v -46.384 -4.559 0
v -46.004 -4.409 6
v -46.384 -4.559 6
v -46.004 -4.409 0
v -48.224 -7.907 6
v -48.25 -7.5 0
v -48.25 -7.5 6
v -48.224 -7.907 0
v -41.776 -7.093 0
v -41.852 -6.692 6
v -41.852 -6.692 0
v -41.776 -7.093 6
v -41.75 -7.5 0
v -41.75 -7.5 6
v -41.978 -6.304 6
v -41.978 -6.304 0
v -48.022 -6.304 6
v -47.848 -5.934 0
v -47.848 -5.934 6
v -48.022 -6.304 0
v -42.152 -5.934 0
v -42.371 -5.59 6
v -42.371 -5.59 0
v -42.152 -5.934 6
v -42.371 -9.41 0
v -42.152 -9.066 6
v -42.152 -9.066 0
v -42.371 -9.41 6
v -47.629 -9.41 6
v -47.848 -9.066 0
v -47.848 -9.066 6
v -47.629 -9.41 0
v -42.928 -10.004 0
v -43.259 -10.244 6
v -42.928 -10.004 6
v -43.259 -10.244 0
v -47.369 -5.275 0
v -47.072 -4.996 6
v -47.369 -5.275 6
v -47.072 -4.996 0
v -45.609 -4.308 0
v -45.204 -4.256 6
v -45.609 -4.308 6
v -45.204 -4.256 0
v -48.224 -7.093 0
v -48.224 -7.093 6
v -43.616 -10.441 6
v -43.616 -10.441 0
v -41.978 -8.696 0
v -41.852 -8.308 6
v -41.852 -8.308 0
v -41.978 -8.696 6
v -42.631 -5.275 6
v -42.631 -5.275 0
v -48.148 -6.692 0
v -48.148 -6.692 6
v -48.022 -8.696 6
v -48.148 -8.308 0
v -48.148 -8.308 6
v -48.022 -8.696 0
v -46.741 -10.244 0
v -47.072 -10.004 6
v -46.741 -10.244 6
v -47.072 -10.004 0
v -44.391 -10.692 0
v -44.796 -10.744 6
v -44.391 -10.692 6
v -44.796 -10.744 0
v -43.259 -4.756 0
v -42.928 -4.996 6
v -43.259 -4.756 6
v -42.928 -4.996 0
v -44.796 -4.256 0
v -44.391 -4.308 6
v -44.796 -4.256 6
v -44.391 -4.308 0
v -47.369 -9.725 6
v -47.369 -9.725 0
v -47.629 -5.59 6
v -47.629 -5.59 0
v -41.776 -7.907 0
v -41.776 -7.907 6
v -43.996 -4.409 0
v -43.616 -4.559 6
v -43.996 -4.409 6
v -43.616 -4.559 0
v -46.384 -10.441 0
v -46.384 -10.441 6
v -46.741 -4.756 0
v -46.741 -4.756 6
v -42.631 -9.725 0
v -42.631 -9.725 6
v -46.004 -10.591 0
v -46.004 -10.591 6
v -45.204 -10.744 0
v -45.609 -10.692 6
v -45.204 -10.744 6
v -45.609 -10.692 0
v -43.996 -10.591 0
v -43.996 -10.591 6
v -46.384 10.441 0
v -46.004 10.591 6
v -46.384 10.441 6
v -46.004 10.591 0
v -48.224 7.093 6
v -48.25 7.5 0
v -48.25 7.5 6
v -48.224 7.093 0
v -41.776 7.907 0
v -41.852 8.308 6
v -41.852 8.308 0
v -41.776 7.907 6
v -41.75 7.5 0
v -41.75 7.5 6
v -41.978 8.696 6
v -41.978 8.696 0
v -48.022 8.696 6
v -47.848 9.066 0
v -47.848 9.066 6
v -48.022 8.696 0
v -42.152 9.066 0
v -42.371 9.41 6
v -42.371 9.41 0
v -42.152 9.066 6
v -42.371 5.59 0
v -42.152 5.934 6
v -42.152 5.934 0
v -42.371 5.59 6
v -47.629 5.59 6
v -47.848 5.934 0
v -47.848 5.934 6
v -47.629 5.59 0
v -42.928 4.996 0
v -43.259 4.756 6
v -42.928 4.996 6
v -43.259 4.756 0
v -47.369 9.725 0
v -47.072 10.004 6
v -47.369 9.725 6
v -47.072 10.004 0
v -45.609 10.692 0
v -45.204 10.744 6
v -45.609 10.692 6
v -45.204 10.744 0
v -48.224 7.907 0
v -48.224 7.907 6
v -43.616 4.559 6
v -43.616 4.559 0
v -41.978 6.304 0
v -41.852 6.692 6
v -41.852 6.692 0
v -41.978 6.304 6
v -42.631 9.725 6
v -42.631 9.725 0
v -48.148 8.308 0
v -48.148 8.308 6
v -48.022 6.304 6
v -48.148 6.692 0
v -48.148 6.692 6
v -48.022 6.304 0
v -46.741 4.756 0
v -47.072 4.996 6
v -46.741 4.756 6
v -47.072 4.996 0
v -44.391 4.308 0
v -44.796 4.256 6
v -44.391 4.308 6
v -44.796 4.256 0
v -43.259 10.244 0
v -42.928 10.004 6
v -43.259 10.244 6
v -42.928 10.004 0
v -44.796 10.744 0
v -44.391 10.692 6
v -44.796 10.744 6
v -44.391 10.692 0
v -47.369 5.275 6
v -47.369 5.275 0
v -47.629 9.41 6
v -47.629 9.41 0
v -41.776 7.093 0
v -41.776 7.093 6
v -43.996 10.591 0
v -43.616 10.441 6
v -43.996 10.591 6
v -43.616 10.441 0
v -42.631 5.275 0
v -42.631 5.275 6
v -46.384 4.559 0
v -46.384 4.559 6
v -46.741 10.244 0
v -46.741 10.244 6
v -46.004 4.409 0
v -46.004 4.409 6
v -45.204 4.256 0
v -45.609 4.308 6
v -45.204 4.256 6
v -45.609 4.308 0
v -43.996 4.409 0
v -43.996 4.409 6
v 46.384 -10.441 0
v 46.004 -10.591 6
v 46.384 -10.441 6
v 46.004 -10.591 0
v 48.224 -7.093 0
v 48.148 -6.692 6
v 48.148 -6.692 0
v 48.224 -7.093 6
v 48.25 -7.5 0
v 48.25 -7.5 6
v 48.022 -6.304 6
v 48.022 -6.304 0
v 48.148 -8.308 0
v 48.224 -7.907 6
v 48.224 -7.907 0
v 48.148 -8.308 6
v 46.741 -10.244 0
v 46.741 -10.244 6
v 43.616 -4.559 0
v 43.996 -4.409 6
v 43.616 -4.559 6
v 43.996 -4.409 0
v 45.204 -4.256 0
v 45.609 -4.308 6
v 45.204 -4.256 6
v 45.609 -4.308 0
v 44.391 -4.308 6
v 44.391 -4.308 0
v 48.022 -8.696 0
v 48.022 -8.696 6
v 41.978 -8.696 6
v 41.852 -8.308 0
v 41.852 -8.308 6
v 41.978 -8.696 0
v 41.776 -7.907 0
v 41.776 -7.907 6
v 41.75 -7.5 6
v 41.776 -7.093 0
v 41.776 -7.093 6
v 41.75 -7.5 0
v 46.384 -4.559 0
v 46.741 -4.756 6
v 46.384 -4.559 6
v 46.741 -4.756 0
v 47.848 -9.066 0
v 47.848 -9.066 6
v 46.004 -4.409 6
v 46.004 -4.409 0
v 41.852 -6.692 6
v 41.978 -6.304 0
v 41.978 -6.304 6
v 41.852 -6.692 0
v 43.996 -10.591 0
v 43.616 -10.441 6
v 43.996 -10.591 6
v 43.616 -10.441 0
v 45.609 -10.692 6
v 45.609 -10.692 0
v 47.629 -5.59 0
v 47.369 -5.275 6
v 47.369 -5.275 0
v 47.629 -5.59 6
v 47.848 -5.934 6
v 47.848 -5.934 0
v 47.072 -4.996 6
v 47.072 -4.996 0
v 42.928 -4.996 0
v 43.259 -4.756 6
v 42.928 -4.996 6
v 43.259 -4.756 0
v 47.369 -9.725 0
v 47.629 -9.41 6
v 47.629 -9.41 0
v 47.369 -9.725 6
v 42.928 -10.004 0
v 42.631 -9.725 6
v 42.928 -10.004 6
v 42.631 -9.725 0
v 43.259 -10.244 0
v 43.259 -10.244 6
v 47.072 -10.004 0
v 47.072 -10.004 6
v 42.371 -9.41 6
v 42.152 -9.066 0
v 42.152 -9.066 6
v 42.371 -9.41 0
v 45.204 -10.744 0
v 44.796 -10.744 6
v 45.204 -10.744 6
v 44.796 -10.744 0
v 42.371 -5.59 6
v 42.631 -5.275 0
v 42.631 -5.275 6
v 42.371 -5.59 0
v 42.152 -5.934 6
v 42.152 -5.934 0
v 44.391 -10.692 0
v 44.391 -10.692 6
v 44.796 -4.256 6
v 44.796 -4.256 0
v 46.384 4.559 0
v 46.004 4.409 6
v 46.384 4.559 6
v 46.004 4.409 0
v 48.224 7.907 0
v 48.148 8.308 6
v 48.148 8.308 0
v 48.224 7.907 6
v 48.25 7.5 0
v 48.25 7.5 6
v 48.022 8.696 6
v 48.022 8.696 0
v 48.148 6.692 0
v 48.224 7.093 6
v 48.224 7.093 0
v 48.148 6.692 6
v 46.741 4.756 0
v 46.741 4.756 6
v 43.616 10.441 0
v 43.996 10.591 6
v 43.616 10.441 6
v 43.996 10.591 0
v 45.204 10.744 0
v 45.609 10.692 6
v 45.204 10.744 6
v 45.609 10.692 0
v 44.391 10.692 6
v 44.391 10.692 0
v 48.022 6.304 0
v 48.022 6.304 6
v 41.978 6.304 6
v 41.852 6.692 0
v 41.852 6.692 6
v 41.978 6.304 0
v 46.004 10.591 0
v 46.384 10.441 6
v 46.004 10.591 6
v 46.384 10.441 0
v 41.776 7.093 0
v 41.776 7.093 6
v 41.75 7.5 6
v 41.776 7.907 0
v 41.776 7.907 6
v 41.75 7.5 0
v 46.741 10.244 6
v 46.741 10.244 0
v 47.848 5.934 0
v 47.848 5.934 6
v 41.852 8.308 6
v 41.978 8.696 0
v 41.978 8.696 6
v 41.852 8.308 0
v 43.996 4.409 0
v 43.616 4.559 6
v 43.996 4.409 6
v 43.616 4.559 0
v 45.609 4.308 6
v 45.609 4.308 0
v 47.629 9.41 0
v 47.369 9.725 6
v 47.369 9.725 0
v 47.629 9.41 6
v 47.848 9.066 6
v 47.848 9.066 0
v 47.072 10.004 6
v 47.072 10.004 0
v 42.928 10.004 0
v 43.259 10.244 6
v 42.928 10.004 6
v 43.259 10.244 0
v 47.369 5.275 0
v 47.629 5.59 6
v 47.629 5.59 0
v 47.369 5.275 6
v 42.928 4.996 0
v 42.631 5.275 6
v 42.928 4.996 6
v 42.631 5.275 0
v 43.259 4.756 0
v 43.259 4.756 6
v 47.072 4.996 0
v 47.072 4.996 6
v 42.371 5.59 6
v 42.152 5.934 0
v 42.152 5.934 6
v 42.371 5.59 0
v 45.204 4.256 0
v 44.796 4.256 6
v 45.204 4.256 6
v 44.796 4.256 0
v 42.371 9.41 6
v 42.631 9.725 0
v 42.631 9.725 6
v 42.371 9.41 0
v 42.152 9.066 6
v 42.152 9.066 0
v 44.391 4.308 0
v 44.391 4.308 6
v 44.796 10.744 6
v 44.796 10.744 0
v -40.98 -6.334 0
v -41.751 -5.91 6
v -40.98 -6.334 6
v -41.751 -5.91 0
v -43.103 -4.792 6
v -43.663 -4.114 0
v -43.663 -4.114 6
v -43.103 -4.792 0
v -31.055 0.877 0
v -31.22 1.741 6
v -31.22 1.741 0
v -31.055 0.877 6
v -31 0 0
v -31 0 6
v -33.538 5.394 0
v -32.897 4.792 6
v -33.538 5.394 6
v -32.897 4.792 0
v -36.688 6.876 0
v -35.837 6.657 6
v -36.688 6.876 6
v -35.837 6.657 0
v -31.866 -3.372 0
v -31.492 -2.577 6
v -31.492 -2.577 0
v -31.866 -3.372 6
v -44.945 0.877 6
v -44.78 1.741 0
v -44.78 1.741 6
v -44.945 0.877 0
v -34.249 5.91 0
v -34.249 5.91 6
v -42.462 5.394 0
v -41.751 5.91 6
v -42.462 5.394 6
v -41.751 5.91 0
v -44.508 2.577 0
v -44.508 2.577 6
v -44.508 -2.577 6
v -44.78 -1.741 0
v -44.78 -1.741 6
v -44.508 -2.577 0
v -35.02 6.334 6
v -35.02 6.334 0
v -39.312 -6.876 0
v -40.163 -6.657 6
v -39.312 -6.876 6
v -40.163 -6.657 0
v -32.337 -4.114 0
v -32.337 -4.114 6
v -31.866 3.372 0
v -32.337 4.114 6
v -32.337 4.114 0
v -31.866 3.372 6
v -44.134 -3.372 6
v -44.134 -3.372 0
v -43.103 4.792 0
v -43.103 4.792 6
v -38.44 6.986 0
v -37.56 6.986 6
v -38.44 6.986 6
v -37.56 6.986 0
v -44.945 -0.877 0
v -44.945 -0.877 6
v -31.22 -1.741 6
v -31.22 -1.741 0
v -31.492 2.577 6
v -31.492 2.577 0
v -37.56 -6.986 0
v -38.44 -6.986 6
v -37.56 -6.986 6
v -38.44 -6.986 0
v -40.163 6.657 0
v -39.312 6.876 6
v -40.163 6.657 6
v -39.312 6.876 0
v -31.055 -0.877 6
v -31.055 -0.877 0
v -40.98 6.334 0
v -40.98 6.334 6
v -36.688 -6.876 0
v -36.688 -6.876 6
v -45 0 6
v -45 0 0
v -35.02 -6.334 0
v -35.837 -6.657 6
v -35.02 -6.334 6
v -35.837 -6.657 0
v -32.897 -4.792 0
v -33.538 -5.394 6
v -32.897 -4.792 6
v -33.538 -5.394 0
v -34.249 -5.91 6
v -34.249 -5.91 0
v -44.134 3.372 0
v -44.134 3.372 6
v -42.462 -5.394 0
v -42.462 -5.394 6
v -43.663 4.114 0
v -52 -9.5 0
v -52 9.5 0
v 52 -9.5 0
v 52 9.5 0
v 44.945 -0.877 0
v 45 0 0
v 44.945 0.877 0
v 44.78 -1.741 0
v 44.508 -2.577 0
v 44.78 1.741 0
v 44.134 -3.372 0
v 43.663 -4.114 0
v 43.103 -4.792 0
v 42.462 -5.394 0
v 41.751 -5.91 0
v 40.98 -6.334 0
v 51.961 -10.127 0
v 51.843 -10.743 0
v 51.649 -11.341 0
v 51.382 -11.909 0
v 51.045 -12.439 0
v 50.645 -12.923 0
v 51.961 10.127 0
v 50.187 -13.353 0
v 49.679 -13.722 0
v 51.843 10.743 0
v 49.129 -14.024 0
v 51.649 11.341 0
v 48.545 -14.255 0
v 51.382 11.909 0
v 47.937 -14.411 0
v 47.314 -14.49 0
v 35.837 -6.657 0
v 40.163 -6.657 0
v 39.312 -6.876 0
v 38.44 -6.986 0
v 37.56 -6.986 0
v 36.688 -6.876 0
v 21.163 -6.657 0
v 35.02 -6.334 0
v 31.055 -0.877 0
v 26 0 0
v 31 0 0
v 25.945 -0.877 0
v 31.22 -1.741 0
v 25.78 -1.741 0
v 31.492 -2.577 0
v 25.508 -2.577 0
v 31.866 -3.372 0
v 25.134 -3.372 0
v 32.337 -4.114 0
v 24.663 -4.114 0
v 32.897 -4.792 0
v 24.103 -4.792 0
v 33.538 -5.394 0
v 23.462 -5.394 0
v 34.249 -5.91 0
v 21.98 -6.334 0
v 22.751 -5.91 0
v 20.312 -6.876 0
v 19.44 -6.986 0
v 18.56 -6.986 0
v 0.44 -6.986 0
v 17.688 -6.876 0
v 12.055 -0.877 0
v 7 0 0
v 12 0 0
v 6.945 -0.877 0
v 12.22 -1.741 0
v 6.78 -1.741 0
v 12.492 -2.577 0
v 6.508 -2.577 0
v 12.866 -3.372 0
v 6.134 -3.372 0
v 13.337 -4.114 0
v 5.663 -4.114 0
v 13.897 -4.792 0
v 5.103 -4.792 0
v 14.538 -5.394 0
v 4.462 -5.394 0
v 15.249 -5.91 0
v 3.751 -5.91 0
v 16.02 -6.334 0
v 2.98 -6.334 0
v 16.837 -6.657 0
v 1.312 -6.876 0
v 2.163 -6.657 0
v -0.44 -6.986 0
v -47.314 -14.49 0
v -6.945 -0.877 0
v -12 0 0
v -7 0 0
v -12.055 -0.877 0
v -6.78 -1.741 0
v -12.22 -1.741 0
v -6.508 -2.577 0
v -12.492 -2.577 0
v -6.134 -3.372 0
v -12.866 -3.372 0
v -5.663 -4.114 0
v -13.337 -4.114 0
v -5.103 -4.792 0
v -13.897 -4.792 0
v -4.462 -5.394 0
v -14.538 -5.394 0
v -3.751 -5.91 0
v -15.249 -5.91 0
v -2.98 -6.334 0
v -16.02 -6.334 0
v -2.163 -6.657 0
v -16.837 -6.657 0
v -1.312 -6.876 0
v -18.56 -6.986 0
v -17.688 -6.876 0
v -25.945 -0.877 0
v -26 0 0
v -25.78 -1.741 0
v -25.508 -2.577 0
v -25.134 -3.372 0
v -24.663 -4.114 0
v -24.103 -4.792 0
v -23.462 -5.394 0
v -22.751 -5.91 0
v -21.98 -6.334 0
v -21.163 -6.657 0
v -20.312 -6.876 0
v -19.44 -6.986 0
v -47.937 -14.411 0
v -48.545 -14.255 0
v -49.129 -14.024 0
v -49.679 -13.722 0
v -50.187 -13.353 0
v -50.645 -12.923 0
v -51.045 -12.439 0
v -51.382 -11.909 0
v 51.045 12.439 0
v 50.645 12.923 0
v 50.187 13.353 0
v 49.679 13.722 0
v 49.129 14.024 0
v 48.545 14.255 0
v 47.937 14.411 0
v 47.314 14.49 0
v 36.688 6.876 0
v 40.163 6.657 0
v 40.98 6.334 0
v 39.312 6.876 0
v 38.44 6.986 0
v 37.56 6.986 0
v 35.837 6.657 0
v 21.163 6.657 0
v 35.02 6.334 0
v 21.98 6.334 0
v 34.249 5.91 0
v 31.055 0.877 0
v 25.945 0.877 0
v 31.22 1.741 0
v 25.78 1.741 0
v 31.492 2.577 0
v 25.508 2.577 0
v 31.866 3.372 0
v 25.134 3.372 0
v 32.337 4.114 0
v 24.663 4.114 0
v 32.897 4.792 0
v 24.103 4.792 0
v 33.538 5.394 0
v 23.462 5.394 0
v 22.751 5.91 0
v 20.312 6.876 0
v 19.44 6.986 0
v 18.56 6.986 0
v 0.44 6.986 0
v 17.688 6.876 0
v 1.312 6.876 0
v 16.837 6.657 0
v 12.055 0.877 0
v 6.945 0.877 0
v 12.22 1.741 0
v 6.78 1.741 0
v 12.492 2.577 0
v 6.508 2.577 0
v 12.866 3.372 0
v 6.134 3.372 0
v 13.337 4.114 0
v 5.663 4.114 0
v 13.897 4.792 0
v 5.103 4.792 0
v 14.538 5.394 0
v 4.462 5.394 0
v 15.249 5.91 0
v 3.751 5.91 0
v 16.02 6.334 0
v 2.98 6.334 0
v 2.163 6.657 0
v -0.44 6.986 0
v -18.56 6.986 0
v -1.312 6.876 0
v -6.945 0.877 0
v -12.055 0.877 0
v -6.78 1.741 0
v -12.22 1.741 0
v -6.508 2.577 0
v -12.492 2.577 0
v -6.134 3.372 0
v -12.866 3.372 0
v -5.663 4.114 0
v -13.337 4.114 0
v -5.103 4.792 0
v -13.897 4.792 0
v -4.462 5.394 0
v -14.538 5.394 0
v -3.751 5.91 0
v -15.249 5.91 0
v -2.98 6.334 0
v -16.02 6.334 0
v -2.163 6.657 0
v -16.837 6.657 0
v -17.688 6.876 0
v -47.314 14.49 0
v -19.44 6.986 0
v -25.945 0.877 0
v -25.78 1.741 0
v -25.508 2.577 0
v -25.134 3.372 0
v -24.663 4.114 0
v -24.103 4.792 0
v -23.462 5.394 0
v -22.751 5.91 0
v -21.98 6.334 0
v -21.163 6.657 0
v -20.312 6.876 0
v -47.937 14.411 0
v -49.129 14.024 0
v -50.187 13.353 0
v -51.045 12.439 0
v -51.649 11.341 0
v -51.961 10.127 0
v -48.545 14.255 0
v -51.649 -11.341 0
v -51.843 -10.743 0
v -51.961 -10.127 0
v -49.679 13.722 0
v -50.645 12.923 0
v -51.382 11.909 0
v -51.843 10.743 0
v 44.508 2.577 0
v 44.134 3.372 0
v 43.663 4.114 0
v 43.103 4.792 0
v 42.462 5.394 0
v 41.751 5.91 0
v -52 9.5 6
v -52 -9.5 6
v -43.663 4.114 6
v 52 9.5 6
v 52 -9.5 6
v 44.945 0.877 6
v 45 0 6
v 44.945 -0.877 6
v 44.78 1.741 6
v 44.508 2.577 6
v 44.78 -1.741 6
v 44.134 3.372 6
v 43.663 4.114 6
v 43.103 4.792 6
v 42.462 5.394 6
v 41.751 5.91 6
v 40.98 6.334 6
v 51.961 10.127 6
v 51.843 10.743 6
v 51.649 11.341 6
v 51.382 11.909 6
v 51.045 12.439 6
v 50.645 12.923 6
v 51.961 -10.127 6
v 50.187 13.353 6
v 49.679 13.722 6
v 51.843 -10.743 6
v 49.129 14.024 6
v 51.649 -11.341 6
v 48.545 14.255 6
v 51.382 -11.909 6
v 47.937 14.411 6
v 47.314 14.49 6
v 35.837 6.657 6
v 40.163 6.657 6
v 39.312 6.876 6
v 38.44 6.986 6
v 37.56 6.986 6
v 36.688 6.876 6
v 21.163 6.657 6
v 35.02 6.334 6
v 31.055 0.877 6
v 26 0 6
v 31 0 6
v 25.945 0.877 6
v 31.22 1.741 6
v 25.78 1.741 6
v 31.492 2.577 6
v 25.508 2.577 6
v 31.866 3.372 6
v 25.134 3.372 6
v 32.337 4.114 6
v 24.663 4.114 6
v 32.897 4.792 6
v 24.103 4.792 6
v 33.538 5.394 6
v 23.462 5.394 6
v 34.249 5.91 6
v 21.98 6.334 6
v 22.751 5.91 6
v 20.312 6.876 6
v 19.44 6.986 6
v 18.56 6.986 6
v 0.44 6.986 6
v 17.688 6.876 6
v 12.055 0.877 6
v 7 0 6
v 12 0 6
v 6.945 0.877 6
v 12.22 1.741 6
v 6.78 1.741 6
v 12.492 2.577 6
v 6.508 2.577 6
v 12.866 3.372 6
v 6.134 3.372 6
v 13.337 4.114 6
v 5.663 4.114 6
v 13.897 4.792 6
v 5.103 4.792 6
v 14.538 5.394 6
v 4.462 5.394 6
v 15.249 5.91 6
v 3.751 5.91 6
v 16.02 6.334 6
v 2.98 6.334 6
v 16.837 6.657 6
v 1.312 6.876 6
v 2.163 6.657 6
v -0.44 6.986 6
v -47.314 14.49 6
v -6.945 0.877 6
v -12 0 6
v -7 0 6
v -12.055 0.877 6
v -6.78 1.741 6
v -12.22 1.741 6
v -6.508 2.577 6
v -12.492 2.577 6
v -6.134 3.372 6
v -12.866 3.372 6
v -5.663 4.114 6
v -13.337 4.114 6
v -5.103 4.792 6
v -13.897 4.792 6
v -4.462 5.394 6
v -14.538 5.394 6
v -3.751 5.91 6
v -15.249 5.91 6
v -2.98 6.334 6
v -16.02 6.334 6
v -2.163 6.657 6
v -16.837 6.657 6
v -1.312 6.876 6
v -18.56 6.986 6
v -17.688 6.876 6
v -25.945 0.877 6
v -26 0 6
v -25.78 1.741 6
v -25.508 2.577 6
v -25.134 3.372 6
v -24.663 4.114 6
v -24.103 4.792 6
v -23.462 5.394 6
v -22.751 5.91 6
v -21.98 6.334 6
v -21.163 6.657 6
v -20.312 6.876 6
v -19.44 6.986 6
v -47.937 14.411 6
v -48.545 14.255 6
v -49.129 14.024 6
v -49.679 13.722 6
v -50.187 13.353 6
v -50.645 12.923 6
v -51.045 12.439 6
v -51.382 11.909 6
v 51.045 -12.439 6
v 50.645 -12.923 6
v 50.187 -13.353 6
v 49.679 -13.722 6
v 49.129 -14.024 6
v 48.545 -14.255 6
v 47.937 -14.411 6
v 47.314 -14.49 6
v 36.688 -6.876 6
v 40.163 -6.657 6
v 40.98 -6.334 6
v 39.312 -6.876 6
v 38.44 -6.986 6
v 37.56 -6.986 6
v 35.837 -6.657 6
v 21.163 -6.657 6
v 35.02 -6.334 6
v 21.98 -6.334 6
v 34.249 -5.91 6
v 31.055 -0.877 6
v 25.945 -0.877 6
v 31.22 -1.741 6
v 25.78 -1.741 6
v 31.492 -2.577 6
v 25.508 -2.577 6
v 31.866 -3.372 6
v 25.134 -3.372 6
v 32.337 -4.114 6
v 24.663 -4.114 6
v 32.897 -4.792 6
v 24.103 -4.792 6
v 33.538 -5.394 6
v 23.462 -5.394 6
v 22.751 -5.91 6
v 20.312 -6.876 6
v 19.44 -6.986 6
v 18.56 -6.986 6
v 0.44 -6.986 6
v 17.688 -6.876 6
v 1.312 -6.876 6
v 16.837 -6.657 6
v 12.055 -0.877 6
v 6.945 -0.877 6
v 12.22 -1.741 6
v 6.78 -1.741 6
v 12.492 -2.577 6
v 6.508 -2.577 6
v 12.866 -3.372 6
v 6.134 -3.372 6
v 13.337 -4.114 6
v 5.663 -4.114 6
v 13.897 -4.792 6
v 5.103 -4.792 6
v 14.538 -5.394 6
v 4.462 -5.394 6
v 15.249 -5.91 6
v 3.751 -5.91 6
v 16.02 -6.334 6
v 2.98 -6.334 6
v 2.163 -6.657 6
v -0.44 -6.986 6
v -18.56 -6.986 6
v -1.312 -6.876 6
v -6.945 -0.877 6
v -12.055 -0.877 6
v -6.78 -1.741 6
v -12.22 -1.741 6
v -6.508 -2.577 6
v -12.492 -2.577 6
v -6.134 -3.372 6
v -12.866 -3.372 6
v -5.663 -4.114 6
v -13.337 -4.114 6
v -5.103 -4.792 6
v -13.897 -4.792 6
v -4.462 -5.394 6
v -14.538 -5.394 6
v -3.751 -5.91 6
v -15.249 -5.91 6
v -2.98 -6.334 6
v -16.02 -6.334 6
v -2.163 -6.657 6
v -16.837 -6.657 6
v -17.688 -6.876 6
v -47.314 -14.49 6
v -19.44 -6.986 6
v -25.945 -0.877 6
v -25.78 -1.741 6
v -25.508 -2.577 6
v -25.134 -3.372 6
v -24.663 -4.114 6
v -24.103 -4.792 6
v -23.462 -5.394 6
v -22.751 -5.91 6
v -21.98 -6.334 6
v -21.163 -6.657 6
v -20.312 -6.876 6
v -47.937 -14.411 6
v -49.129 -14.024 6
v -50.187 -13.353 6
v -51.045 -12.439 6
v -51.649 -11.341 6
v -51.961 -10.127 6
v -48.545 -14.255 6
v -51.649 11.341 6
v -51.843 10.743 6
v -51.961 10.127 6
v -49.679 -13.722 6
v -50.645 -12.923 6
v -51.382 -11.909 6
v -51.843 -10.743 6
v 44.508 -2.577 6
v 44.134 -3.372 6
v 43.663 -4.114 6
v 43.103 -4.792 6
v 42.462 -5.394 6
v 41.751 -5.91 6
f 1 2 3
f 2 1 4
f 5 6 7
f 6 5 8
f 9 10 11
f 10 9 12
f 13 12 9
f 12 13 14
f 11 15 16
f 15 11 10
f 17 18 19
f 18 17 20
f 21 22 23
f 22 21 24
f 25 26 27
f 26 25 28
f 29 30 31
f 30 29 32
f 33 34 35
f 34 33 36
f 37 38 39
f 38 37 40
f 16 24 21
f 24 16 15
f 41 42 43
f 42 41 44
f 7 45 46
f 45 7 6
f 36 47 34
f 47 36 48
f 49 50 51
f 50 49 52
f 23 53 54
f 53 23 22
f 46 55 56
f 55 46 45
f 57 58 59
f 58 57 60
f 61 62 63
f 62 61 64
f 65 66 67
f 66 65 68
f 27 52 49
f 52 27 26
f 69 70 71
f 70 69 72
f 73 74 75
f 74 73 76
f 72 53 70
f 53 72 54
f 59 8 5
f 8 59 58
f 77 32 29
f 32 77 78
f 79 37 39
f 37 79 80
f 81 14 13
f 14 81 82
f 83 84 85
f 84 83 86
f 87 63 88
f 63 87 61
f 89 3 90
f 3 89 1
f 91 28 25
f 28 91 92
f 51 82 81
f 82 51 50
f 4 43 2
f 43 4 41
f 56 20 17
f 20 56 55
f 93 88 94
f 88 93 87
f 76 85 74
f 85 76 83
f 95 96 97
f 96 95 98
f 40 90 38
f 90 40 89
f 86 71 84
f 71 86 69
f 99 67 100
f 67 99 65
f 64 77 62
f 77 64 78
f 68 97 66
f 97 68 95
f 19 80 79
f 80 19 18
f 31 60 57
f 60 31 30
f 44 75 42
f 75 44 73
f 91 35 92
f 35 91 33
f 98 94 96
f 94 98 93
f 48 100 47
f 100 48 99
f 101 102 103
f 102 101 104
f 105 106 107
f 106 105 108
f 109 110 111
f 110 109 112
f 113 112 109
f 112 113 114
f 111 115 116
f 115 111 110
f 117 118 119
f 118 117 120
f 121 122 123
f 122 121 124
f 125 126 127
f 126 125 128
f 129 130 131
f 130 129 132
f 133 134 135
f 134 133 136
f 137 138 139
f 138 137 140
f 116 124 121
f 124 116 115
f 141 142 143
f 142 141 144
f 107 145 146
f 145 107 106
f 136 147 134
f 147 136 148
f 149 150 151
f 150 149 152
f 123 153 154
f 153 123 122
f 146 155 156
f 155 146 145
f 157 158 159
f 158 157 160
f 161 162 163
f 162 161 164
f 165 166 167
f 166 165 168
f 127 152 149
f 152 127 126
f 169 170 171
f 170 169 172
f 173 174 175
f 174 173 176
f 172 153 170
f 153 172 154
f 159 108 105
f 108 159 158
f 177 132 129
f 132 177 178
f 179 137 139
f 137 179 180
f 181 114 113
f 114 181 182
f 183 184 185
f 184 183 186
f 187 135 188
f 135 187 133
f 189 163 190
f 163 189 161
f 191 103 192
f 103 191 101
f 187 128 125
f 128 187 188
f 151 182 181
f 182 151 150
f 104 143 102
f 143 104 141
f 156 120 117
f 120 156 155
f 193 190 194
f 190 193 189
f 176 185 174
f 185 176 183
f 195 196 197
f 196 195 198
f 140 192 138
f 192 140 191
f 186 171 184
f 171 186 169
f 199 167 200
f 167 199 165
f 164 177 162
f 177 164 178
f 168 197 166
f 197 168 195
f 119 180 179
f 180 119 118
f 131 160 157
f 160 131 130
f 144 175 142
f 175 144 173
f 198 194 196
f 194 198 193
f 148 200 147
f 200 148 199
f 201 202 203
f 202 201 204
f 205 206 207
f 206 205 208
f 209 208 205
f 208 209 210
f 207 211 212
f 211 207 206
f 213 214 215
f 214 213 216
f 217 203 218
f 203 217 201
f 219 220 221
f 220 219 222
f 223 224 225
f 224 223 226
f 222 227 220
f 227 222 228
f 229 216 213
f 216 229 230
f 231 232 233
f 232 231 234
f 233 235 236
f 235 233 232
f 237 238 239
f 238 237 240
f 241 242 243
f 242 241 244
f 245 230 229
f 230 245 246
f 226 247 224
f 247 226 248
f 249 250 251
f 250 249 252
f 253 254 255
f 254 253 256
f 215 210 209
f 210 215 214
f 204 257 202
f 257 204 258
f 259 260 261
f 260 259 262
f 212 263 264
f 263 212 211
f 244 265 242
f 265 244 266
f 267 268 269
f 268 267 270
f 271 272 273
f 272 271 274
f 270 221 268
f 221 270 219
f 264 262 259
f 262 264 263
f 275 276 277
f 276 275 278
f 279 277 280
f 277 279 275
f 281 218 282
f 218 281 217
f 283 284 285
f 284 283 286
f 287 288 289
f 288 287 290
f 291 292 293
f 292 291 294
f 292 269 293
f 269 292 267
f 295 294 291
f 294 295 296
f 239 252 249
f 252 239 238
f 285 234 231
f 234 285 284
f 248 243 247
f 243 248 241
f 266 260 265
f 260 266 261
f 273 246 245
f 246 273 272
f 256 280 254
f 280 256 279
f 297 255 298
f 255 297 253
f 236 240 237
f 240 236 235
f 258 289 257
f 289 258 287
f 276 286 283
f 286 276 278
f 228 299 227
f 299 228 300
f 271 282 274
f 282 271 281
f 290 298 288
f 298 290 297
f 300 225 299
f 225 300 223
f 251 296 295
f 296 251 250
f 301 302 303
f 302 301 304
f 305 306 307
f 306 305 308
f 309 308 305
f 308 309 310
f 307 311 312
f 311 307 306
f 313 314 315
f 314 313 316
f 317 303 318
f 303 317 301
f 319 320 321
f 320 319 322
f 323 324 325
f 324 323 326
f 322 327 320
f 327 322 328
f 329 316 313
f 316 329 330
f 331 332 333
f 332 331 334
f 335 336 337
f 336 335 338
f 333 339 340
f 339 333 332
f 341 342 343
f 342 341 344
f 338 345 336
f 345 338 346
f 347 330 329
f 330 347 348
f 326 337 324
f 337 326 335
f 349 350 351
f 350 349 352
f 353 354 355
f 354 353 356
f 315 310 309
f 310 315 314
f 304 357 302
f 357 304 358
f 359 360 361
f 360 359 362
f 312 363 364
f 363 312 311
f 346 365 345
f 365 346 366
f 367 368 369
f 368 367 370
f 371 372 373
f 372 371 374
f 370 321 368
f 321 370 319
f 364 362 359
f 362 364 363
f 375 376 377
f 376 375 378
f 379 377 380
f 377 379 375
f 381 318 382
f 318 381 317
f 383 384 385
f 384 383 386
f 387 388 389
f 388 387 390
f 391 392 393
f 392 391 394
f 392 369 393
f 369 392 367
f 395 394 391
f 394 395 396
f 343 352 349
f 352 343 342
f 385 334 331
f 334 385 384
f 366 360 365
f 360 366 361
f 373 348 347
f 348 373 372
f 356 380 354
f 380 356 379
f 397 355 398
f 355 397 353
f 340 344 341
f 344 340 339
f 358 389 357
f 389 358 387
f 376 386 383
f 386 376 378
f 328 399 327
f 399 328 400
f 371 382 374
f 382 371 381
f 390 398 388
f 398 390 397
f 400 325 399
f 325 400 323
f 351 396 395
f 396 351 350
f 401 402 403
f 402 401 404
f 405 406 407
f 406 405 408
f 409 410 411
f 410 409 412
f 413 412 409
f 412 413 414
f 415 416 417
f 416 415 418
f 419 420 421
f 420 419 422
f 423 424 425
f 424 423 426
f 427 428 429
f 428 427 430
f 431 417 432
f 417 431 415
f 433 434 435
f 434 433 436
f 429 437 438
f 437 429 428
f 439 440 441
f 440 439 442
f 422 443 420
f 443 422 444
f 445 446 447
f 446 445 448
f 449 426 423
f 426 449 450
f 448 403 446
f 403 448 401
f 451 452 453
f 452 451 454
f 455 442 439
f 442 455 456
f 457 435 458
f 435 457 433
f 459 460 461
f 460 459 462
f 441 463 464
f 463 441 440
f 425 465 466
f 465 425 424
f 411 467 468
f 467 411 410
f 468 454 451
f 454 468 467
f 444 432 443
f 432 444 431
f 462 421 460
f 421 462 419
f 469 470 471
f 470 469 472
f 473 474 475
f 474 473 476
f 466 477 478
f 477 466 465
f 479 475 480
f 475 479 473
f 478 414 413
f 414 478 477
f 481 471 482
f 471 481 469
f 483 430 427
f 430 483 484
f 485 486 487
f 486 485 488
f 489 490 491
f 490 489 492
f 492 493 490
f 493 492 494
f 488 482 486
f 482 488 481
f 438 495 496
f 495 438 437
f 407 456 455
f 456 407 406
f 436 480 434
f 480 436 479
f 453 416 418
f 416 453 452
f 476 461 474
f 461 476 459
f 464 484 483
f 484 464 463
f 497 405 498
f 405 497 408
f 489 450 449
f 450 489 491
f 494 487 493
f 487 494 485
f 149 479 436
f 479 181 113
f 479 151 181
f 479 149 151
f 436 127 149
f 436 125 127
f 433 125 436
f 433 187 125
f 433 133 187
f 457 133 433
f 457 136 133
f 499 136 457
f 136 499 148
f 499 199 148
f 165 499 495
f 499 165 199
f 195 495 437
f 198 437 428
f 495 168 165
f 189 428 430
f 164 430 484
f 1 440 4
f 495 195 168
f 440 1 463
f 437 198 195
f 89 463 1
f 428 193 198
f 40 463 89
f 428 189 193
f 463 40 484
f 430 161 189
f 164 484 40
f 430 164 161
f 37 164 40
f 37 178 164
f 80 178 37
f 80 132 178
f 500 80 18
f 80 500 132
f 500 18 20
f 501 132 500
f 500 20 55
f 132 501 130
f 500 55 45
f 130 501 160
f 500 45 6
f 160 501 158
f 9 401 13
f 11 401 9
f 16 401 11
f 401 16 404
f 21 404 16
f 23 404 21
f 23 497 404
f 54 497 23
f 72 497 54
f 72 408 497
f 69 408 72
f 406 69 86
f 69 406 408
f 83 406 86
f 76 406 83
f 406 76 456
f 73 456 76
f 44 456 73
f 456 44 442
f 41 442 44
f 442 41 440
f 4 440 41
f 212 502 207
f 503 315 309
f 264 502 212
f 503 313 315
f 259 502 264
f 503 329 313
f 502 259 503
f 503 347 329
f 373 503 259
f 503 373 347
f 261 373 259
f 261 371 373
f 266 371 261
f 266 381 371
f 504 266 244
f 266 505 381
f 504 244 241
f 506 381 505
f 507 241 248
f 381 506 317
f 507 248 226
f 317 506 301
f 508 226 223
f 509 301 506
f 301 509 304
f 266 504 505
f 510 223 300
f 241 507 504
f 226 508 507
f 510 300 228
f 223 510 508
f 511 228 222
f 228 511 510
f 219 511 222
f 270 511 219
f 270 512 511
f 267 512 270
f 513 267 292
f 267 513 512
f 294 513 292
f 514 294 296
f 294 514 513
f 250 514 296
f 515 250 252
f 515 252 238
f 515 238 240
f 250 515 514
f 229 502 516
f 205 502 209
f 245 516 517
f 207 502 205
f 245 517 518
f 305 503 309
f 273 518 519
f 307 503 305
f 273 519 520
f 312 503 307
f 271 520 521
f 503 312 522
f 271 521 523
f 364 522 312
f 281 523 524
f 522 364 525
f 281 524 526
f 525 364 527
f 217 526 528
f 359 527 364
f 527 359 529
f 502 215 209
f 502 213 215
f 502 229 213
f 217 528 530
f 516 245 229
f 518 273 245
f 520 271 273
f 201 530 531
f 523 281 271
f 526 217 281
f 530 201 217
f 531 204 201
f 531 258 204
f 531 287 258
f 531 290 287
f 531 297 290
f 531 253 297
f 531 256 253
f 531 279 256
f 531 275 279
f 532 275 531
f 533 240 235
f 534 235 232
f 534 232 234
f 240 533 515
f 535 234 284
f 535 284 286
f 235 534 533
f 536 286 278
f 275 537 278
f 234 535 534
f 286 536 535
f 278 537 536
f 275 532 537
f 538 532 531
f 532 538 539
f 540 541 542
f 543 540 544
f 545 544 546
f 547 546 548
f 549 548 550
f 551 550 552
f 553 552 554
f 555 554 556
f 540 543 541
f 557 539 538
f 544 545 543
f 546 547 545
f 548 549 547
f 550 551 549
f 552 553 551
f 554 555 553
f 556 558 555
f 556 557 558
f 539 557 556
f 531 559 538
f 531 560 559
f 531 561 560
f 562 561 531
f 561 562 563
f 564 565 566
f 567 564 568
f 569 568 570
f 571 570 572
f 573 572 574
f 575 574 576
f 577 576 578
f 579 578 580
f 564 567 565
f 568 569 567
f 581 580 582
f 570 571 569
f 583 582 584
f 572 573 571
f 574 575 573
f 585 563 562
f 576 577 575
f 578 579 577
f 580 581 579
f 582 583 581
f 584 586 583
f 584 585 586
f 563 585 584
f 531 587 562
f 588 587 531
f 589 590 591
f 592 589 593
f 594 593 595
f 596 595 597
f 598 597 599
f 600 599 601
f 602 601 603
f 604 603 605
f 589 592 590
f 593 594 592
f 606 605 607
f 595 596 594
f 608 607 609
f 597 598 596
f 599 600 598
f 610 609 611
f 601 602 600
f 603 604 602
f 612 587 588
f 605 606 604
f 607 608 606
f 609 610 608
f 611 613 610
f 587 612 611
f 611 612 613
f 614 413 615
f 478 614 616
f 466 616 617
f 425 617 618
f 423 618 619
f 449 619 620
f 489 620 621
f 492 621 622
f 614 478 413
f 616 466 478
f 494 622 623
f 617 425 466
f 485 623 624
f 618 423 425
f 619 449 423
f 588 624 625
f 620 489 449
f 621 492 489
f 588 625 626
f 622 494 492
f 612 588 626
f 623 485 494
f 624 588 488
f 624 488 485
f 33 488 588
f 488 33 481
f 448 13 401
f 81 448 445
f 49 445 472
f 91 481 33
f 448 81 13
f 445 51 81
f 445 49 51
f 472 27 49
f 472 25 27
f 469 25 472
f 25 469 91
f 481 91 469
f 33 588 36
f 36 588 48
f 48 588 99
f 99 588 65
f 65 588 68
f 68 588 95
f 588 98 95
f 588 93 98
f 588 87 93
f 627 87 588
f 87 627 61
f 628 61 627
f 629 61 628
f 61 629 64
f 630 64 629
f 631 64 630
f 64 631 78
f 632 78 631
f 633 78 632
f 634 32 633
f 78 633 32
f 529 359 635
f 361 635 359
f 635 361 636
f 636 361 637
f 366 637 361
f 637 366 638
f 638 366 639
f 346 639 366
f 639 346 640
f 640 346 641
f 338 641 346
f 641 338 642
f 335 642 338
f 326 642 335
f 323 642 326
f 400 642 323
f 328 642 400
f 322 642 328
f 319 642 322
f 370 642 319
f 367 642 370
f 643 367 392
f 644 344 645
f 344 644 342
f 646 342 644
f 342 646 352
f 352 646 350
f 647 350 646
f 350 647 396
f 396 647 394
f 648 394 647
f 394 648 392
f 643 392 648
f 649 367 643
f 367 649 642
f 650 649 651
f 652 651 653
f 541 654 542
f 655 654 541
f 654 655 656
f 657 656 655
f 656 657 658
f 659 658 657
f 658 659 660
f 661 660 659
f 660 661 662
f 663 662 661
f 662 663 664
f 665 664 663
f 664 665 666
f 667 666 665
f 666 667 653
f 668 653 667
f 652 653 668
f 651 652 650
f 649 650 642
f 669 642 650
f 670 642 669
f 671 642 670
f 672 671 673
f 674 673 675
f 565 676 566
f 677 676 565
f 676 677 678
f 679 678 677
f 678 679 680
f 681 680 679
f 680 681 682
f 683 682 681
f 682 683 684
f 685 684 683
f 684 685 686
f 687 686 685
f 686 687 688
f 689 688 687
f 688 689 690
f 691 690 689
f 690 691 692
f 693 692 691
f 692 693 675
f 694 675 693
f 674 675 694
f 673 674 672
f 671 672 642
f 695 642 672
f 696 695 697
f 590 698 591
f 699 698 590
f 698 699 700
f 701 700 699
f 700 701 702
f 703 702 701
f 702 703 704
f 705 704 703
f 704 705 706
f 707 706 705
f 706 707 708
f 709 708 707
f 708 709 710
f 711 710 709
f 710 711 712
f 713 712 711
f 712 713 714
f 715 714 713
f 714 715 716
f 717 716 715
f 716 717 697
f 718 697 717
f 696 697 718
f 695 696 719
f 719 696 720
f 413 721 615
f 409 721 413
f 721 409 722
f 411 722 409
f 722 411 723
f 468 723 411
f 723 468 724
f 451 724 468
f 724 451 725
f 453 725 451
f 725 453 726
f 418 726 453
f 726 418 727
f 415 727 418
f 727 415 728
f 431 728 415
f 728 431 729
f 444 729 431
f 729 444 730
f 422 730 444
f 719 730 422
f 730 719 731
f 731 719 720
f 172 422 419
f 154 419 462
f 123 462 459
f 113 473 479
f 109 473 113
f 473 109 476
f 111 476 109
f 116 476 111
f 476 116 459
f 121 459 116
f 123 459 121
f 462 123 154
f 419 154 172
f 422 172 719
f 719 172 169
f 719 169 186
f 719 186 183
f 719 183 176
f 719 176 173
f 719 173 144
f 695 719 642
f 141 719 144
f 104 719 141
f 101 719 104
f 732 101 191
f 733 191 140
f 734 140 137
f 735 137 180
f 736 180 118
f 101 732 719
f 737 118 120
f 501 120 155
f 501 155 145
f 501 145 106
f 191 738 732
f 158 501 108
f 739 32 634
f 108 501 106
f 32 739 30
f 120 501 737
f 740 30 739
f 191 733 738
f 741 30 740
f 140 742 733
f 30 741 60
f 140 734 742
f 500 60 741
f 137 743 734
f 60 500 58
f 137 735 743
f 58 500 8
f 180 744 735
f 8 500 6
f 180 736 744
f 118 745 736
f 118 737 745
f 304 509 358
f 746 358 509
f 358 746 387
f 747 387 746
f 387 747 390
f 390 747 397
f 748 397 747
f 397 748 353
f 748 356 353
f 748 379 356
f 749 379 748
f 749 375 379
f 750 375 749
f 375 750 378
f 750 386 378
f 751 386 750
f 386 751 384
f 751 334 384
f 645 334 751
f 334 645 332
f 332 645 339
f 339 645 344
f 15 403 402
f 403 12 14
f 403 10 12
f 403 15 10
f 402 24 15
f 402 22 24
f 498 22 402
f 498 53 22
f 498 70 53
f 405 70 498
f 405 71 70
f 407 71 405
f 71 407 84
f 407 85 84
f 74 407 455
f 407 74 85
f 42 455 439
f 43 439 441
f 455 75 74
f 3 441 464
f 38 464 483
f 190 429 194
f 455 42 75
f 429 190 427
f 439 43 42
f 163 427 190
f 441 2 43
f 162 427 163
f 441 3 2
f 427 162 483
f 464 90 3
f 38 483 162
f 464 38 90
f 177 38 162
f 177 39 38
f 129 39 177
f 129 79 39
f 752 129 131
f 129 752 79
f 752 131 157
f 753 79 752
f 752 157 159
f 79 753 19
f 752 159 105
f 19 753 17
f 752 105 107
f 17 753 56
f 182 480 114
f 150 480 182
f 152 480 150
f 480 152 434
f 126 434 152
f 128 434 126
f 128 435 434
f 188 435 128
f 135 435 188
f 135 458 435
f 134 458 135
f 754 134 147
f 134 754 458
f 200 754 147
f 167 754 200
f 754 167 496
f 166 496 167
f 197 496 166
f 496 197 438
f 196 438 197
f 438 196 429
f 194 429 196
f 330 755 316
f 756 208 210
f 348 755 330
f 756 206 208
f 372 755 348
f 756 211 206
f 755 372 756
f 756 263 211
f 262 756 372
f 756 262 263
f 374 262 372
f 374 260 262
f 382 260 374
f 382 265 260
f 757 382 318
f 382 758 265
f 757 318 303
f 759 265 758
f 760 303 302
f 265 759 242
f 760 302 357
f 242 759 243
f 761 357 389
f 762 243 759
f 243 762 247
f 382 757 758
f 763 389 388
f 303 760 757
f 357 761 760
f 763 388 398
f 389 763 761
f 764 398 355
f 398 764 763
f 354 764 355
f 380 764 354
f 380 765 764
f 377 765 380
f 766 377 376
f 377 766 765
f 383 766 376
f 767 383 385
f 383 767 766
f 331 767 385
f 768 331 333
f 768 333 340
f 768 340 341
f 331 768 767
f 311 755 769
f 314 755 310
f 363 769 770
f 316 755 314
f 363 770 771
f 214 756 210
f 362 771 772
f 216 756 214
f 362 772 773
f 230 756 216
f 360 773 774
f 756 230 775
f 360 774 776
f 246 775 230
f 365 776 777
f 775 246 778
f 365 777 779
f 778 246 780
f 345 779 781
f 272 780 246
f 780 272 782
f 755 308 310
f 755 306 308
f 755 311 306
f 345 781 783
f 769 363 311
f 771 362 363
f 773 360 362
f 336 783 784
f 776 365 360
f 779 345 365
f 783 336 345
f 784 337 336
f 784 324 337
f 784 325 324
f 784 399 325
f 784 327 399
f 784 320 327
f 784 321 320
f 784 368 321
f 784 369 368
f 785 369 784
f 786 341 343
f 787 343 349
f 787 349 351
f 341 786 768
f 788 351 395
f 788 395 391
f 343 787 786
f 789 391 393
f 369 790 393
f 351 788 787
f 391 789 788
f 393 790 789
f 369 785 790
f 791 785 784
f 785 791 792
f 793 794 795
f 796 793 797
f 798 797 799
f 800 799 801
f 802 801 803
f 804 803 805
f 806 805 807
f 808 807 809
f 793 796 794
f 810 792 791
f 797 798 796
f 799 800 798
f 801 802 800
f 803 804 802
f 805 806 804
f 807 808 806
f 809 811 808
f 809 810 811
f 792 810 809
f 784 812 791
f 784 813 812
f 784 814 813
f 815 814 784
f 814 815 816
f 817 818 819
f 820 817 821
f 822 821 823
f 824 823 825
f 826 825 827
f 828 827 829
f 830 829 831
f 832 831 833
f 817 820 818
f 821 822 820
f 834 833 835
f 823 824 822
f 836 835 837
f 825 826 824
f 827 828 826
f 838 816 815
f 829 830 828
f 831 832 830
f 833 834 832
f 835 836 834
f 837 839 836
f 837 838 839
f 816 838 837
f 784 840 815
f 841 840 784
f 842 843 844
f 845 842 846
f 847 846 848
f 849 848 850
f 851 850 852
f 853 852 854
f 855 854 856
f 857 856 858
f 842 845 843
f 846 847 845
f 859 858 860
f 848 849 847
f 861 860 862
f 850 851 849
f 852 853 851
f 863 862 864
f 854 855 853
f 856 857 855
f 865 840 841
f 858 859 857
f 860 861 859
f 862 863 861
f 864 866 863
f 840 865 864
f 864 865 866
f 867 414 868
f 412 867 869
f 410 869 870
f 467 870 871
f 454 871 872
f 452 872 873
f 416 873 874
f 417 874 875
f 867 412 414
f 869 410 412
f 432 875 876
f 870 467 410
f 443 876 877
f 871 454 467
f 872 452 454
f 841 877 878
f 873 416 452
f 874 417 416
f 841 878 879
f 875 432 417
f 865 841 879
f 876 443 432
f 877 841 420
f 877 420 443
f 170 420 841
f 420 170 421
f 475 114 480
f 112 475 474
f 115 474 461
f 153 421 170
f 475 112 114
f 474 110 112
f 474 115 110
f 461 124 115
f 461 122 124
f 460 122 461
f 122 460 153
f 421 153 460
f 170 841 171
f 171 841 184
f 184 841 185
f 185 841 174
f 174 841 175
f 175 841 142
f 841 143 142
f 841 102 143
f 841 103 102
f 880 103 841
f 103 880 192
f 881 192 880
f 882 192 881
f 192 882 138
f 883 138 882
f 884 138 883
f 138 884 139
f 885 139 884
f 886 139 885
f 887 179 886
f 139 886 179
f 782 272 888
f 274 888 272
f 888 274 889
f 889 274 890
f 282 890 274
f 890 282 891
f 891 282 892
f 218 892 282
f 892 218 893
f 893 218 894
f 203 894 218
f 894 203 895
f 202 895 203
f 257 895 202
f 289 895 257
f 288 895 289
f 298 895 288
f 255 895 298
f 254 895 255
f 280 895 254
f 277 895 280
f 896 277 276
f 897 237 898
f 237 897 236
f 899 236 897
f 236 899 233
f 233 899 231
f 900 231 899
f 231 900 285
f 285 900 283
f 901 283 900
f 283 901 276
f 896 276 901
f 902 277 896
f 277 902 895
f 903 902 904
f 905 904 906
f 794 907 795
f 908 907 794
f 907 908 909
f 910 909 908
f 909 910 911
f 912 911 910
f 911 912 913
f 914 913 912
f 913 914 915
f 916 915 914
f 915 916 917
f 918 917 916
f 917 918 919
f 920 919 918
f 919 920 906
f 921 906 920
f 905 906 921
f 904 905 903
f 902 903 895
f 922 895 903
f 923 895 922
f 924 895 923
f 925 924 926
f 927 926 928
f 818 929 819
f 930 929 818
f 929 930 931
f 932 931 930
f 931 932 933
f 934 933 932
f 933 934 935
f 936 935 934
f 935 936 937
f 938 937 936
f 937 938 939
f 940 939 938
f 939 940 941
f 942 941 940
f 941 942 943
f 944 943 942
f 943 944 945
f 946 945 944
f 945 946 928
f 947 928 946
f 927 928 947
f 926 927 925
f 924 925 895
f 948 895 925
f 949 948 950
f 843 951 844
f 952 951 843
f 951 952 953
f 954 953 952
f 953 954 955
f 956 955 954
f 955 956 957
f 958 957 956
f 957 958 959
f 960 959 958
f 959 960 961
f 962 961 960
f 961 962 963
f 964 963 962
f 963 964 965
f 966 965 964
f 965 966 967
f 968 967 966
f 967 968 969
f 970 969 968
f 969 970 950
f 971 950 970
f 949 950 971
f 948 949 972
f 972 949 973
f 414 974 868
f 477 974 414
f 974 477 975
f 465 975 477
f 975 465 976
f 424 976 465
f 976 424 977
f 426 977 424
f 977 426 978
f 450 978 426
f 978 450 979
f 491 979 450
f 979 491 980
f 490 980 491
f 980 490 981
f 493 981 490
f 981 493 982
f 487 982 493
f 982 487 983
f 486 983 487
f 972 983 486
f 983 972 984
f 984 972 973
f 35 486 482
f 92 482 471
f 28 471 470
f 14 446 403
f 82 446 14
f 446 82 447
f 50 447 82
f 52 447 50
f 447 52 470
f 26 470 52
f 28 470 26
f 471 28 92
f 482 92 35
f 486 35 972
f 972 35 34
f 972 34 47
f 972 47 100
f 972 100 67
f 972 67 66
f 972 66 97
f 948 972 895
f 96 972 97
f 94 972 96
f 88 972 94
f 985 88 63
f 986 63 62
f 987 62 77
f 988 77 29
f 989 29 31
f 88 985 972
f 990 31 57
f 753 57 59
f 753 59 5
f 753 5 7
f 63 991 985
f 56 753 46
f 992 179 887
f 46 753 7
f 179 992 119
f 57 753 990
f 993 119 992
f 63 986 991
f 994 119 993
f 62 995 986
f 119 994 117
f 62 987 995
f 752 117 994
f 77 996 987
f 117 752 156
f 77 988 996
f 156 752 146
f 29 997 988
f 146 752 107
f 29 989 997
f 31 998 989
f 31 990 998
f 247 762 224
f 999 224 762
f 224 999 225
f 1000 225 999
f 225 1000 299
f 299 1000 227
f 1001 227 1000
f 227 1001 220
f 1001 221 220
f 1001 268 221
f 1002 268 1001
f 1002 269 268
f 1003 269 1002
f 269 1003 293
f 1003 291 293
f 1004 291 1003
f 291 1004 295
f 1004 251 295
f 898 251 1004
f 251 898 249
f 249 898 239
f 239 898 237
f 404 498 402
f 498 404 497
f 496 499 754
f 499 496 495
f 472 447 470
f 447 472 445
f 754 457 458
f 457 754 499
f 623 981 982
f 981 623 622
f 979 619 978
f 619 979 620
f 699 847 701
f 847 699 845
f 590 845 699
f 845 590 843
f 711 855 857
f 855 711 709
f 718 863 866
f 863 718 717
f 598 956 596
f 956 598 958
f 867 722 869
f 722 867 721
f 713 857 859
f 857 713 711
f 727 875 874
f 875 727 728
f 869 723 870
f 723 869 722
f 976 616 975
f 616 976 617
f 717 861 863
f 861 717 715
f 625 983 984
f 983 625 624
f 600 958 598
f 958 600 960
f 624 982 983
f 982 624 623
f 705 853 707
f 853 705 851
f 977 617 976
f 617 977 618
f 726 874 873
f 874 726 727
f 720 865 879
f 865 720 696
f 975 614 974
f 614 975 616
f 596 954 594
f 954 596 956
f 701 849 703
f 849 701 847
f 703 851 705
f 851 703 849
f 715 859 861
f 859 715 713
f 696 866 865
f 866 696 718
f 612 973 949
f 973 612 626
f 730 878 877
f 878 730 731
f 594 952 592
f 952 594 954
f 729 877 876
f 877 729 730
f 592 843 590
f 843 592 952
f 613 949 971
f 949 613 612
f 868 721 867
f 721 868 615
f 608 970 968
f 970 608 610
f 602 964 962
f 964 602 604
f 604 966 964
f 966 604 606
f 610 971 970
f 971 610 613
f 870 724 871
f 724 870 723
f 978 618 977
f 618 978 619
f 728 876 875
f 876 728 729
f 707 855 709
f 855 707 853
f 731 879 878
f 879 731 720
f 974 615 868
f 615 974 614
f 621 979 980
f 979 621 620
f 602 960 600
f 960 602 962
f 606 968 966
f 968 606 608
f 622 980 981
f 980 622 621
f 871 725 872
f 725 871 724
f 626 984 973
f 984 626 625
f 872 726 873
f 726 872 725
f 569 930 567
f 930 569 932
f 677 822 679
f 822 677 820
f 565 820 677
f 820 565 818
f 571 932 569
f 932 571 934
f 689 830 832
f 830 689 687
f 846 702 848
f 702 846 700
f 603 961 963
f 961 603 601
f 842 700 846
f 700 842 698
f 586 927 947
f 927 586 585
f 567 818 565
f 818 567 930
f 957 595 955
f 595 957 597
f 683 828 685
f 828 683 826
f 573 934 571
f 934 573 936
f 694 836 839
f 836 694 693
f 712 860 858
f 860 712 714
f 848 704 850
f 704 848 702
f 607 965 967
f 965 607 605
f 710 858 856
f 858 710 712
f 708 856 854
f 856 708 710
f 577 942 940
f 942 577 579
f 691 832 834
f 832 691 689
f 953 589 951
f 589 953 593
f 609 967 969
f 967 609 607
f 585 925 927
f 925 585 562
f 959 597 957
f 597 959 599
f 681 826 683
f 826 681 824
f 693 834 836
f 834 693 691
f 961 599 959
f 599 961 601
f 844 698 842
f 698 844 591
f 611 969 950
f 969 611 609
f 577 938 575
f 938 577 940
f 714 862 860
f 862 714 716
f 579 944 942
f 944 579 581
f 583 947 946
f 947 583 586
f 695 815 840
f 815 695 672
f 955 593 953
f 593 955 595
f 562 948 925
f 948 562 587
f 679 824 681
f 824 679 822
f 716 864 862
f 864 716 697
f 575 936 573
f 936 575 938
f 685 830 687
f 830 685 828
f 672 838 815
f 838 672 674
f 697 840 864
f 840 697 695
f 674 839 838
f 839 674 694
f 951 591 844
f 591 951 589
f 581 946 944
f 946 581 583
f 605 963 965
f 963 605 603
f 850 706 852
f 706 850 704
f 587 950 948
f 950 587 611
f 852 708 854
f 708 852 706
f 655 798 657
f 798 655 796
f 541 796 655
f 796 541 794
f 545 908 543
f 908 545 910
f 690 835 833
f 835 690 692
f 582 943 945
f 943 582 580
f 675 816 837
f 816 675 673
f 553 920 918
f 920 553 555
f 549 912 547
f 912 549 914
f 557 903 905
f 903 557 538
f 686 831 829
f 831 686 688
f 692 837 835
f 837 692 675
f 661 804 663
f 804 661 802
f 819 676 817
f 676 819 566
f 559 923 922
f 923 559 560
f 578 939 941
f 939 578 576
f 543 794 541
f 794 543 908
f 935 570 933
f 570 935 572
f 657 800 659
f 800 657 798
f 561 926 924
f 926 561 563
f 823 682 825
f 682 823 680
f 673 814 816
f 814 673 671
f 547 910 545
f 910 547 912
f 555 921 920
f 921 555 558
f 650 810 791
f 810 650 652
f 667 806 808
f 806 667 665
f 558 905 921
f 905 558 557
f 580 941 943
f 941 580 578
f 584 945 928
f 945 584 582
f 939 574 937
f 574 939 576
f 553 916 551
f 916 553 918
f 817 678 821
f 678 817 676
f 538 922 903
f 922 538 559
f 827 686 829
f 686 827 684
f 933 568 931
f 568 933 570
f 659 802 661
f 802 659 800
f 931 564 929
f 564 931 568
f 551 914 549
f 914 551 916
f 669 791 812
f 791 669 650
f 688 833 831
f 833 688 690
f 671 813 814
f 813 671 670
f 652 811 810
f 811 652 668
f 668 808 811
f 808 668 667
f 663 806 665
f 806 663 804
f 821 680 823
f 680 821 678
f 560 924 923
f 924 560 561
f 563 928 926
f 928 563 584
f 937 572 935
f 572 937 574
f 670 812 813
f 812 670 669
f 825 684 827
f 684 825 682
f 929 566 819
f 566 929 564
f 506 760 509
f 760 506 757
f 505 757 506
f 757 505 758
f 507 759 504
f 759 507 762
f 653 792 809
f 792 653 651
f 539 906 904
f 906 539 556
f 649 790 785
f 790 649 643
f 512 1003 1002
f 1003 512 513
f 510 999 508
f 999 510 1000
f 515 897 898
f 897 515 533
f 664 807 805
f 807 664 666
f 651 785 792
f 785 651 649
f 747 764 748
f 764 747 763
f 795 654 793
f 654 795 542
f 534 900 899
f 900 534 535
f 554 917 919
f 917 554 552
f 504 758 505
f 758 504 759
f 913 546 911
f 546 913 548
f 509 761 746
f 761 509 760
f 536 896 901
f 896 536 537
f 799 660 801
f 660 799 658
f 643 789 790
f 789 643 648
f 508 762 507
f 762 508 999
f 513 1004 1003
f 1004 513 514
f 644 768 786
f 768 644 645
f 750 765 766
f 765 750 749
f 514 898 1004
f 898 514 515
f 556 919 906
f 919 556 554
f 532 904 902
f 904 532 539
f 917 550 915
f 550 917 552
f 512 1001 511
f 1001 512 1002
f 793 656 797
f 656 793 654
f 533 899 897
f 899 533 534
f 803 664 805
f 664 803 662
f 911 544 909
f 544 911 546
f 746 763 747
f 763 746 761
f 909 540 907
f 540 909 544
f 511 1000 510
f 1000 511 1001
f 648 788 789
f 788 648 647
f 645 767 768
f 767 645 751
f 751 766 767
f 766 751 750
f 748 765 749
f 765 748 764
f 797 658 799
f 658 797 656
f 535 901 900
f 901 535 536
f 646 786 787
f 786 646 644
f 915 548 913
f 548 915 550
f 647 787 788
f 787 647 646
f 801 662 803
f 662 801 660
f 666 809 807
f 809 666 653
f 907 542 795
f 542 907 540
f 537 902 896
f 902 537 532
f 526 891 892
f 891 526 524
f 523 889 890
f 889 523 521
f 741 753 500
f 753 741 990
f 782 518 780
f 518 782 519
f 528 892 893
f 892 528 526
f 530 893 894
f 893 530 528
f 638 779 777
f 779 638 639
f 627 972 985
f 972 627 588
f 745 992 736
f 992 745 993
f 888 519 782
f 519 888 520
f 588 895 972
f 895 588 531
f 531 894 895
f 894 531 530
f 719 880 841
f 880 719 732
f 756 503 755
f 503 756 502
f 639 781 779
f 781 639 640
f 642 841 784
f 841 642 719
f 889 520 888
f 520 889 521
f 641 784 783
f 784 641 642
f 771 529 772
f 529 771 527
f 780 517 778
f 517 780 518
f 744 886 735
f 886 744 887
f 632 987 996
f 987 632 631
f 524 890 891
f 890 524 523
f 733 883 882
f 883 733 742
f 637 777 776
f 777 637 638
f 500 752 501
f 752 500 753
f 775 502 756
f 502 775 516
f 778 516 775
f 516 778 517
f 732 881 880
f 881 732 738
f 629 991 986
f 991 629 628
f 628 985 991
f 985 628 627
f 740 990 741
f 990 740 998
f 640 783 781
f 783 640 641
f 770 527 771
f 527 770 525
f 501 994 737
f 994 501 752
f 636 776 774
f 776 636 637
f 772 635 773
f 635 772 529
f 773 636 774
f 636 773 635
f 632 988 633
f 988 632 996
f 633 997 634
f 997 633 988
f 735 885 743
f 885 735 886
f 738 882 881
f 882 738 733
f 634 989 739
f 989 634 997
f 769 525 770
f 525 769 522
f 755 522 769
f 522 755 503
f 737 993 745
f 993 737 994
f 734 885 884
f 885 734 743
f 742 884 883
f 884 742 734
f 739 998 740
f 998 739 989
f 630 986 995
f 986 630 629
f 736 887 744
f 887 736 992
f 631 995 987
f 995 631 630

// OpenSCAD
$fn = 50;


difference() {
	union() {
		hull() {
			translate(v = [-47.0000000000, 9.5000000000, 0]) {
				cylinder(h = 6, r = 5);
			}
			translate(v = [47.0000000000, 9.5000000000, 0]) {
				cylinder(h = 6, r = 5);
			}
			translate(v = [-47.0000000000, -9.5000000000, 0]) {
				cylinder(h = 6, r = 5);
			}
			translate(v = [47.0000000000, -9.5000000000, 0]) {
				cylinder(h = 6, r = 5);
			}
		}
	}
	union() {
		#translate(v = [-45.0000000000, -7.5000000000, -100.0000000000]) {
			cylinder(h = 200, r = 3.2500000000);
		}
		#translate(v = [-45.0000000000, 7.5000000000, -100.0000000000]) {
			cylinder(h = 200, r = 3.2500000000);
		}
		#translate(v = [45.0000000000, -7.5000000000, -100.0000000000]) {
			cylinder(h = 200, r = 3.2500000000);
		}
		#translate(v = [45.0000000000, 7.5000000000, -100.0000000000]) {
			cylinder(h = 200, r = 3.2500000000);
		}
		#translate(v = [-38.0000000000, 0, 0]) {
			cylinder(h = 6, r = 7.0000000000);
		}
		#translate(v = [-19.0000000000, 0, 0]) {
			cylinder(h = 6, r = 7.0000000000);
		}
		#cylinder(h = 6, r = 7.0000000000);
		#translate(v = [19.0000000000, 0, 0]) {
			cylinder(h = 6, r = 7.0000000000);
		}
		#translate(v = [38.0000000000, 0, 0]) {
			cylinder(h = 6, r = 7.0000000000);
		}
	}
}
